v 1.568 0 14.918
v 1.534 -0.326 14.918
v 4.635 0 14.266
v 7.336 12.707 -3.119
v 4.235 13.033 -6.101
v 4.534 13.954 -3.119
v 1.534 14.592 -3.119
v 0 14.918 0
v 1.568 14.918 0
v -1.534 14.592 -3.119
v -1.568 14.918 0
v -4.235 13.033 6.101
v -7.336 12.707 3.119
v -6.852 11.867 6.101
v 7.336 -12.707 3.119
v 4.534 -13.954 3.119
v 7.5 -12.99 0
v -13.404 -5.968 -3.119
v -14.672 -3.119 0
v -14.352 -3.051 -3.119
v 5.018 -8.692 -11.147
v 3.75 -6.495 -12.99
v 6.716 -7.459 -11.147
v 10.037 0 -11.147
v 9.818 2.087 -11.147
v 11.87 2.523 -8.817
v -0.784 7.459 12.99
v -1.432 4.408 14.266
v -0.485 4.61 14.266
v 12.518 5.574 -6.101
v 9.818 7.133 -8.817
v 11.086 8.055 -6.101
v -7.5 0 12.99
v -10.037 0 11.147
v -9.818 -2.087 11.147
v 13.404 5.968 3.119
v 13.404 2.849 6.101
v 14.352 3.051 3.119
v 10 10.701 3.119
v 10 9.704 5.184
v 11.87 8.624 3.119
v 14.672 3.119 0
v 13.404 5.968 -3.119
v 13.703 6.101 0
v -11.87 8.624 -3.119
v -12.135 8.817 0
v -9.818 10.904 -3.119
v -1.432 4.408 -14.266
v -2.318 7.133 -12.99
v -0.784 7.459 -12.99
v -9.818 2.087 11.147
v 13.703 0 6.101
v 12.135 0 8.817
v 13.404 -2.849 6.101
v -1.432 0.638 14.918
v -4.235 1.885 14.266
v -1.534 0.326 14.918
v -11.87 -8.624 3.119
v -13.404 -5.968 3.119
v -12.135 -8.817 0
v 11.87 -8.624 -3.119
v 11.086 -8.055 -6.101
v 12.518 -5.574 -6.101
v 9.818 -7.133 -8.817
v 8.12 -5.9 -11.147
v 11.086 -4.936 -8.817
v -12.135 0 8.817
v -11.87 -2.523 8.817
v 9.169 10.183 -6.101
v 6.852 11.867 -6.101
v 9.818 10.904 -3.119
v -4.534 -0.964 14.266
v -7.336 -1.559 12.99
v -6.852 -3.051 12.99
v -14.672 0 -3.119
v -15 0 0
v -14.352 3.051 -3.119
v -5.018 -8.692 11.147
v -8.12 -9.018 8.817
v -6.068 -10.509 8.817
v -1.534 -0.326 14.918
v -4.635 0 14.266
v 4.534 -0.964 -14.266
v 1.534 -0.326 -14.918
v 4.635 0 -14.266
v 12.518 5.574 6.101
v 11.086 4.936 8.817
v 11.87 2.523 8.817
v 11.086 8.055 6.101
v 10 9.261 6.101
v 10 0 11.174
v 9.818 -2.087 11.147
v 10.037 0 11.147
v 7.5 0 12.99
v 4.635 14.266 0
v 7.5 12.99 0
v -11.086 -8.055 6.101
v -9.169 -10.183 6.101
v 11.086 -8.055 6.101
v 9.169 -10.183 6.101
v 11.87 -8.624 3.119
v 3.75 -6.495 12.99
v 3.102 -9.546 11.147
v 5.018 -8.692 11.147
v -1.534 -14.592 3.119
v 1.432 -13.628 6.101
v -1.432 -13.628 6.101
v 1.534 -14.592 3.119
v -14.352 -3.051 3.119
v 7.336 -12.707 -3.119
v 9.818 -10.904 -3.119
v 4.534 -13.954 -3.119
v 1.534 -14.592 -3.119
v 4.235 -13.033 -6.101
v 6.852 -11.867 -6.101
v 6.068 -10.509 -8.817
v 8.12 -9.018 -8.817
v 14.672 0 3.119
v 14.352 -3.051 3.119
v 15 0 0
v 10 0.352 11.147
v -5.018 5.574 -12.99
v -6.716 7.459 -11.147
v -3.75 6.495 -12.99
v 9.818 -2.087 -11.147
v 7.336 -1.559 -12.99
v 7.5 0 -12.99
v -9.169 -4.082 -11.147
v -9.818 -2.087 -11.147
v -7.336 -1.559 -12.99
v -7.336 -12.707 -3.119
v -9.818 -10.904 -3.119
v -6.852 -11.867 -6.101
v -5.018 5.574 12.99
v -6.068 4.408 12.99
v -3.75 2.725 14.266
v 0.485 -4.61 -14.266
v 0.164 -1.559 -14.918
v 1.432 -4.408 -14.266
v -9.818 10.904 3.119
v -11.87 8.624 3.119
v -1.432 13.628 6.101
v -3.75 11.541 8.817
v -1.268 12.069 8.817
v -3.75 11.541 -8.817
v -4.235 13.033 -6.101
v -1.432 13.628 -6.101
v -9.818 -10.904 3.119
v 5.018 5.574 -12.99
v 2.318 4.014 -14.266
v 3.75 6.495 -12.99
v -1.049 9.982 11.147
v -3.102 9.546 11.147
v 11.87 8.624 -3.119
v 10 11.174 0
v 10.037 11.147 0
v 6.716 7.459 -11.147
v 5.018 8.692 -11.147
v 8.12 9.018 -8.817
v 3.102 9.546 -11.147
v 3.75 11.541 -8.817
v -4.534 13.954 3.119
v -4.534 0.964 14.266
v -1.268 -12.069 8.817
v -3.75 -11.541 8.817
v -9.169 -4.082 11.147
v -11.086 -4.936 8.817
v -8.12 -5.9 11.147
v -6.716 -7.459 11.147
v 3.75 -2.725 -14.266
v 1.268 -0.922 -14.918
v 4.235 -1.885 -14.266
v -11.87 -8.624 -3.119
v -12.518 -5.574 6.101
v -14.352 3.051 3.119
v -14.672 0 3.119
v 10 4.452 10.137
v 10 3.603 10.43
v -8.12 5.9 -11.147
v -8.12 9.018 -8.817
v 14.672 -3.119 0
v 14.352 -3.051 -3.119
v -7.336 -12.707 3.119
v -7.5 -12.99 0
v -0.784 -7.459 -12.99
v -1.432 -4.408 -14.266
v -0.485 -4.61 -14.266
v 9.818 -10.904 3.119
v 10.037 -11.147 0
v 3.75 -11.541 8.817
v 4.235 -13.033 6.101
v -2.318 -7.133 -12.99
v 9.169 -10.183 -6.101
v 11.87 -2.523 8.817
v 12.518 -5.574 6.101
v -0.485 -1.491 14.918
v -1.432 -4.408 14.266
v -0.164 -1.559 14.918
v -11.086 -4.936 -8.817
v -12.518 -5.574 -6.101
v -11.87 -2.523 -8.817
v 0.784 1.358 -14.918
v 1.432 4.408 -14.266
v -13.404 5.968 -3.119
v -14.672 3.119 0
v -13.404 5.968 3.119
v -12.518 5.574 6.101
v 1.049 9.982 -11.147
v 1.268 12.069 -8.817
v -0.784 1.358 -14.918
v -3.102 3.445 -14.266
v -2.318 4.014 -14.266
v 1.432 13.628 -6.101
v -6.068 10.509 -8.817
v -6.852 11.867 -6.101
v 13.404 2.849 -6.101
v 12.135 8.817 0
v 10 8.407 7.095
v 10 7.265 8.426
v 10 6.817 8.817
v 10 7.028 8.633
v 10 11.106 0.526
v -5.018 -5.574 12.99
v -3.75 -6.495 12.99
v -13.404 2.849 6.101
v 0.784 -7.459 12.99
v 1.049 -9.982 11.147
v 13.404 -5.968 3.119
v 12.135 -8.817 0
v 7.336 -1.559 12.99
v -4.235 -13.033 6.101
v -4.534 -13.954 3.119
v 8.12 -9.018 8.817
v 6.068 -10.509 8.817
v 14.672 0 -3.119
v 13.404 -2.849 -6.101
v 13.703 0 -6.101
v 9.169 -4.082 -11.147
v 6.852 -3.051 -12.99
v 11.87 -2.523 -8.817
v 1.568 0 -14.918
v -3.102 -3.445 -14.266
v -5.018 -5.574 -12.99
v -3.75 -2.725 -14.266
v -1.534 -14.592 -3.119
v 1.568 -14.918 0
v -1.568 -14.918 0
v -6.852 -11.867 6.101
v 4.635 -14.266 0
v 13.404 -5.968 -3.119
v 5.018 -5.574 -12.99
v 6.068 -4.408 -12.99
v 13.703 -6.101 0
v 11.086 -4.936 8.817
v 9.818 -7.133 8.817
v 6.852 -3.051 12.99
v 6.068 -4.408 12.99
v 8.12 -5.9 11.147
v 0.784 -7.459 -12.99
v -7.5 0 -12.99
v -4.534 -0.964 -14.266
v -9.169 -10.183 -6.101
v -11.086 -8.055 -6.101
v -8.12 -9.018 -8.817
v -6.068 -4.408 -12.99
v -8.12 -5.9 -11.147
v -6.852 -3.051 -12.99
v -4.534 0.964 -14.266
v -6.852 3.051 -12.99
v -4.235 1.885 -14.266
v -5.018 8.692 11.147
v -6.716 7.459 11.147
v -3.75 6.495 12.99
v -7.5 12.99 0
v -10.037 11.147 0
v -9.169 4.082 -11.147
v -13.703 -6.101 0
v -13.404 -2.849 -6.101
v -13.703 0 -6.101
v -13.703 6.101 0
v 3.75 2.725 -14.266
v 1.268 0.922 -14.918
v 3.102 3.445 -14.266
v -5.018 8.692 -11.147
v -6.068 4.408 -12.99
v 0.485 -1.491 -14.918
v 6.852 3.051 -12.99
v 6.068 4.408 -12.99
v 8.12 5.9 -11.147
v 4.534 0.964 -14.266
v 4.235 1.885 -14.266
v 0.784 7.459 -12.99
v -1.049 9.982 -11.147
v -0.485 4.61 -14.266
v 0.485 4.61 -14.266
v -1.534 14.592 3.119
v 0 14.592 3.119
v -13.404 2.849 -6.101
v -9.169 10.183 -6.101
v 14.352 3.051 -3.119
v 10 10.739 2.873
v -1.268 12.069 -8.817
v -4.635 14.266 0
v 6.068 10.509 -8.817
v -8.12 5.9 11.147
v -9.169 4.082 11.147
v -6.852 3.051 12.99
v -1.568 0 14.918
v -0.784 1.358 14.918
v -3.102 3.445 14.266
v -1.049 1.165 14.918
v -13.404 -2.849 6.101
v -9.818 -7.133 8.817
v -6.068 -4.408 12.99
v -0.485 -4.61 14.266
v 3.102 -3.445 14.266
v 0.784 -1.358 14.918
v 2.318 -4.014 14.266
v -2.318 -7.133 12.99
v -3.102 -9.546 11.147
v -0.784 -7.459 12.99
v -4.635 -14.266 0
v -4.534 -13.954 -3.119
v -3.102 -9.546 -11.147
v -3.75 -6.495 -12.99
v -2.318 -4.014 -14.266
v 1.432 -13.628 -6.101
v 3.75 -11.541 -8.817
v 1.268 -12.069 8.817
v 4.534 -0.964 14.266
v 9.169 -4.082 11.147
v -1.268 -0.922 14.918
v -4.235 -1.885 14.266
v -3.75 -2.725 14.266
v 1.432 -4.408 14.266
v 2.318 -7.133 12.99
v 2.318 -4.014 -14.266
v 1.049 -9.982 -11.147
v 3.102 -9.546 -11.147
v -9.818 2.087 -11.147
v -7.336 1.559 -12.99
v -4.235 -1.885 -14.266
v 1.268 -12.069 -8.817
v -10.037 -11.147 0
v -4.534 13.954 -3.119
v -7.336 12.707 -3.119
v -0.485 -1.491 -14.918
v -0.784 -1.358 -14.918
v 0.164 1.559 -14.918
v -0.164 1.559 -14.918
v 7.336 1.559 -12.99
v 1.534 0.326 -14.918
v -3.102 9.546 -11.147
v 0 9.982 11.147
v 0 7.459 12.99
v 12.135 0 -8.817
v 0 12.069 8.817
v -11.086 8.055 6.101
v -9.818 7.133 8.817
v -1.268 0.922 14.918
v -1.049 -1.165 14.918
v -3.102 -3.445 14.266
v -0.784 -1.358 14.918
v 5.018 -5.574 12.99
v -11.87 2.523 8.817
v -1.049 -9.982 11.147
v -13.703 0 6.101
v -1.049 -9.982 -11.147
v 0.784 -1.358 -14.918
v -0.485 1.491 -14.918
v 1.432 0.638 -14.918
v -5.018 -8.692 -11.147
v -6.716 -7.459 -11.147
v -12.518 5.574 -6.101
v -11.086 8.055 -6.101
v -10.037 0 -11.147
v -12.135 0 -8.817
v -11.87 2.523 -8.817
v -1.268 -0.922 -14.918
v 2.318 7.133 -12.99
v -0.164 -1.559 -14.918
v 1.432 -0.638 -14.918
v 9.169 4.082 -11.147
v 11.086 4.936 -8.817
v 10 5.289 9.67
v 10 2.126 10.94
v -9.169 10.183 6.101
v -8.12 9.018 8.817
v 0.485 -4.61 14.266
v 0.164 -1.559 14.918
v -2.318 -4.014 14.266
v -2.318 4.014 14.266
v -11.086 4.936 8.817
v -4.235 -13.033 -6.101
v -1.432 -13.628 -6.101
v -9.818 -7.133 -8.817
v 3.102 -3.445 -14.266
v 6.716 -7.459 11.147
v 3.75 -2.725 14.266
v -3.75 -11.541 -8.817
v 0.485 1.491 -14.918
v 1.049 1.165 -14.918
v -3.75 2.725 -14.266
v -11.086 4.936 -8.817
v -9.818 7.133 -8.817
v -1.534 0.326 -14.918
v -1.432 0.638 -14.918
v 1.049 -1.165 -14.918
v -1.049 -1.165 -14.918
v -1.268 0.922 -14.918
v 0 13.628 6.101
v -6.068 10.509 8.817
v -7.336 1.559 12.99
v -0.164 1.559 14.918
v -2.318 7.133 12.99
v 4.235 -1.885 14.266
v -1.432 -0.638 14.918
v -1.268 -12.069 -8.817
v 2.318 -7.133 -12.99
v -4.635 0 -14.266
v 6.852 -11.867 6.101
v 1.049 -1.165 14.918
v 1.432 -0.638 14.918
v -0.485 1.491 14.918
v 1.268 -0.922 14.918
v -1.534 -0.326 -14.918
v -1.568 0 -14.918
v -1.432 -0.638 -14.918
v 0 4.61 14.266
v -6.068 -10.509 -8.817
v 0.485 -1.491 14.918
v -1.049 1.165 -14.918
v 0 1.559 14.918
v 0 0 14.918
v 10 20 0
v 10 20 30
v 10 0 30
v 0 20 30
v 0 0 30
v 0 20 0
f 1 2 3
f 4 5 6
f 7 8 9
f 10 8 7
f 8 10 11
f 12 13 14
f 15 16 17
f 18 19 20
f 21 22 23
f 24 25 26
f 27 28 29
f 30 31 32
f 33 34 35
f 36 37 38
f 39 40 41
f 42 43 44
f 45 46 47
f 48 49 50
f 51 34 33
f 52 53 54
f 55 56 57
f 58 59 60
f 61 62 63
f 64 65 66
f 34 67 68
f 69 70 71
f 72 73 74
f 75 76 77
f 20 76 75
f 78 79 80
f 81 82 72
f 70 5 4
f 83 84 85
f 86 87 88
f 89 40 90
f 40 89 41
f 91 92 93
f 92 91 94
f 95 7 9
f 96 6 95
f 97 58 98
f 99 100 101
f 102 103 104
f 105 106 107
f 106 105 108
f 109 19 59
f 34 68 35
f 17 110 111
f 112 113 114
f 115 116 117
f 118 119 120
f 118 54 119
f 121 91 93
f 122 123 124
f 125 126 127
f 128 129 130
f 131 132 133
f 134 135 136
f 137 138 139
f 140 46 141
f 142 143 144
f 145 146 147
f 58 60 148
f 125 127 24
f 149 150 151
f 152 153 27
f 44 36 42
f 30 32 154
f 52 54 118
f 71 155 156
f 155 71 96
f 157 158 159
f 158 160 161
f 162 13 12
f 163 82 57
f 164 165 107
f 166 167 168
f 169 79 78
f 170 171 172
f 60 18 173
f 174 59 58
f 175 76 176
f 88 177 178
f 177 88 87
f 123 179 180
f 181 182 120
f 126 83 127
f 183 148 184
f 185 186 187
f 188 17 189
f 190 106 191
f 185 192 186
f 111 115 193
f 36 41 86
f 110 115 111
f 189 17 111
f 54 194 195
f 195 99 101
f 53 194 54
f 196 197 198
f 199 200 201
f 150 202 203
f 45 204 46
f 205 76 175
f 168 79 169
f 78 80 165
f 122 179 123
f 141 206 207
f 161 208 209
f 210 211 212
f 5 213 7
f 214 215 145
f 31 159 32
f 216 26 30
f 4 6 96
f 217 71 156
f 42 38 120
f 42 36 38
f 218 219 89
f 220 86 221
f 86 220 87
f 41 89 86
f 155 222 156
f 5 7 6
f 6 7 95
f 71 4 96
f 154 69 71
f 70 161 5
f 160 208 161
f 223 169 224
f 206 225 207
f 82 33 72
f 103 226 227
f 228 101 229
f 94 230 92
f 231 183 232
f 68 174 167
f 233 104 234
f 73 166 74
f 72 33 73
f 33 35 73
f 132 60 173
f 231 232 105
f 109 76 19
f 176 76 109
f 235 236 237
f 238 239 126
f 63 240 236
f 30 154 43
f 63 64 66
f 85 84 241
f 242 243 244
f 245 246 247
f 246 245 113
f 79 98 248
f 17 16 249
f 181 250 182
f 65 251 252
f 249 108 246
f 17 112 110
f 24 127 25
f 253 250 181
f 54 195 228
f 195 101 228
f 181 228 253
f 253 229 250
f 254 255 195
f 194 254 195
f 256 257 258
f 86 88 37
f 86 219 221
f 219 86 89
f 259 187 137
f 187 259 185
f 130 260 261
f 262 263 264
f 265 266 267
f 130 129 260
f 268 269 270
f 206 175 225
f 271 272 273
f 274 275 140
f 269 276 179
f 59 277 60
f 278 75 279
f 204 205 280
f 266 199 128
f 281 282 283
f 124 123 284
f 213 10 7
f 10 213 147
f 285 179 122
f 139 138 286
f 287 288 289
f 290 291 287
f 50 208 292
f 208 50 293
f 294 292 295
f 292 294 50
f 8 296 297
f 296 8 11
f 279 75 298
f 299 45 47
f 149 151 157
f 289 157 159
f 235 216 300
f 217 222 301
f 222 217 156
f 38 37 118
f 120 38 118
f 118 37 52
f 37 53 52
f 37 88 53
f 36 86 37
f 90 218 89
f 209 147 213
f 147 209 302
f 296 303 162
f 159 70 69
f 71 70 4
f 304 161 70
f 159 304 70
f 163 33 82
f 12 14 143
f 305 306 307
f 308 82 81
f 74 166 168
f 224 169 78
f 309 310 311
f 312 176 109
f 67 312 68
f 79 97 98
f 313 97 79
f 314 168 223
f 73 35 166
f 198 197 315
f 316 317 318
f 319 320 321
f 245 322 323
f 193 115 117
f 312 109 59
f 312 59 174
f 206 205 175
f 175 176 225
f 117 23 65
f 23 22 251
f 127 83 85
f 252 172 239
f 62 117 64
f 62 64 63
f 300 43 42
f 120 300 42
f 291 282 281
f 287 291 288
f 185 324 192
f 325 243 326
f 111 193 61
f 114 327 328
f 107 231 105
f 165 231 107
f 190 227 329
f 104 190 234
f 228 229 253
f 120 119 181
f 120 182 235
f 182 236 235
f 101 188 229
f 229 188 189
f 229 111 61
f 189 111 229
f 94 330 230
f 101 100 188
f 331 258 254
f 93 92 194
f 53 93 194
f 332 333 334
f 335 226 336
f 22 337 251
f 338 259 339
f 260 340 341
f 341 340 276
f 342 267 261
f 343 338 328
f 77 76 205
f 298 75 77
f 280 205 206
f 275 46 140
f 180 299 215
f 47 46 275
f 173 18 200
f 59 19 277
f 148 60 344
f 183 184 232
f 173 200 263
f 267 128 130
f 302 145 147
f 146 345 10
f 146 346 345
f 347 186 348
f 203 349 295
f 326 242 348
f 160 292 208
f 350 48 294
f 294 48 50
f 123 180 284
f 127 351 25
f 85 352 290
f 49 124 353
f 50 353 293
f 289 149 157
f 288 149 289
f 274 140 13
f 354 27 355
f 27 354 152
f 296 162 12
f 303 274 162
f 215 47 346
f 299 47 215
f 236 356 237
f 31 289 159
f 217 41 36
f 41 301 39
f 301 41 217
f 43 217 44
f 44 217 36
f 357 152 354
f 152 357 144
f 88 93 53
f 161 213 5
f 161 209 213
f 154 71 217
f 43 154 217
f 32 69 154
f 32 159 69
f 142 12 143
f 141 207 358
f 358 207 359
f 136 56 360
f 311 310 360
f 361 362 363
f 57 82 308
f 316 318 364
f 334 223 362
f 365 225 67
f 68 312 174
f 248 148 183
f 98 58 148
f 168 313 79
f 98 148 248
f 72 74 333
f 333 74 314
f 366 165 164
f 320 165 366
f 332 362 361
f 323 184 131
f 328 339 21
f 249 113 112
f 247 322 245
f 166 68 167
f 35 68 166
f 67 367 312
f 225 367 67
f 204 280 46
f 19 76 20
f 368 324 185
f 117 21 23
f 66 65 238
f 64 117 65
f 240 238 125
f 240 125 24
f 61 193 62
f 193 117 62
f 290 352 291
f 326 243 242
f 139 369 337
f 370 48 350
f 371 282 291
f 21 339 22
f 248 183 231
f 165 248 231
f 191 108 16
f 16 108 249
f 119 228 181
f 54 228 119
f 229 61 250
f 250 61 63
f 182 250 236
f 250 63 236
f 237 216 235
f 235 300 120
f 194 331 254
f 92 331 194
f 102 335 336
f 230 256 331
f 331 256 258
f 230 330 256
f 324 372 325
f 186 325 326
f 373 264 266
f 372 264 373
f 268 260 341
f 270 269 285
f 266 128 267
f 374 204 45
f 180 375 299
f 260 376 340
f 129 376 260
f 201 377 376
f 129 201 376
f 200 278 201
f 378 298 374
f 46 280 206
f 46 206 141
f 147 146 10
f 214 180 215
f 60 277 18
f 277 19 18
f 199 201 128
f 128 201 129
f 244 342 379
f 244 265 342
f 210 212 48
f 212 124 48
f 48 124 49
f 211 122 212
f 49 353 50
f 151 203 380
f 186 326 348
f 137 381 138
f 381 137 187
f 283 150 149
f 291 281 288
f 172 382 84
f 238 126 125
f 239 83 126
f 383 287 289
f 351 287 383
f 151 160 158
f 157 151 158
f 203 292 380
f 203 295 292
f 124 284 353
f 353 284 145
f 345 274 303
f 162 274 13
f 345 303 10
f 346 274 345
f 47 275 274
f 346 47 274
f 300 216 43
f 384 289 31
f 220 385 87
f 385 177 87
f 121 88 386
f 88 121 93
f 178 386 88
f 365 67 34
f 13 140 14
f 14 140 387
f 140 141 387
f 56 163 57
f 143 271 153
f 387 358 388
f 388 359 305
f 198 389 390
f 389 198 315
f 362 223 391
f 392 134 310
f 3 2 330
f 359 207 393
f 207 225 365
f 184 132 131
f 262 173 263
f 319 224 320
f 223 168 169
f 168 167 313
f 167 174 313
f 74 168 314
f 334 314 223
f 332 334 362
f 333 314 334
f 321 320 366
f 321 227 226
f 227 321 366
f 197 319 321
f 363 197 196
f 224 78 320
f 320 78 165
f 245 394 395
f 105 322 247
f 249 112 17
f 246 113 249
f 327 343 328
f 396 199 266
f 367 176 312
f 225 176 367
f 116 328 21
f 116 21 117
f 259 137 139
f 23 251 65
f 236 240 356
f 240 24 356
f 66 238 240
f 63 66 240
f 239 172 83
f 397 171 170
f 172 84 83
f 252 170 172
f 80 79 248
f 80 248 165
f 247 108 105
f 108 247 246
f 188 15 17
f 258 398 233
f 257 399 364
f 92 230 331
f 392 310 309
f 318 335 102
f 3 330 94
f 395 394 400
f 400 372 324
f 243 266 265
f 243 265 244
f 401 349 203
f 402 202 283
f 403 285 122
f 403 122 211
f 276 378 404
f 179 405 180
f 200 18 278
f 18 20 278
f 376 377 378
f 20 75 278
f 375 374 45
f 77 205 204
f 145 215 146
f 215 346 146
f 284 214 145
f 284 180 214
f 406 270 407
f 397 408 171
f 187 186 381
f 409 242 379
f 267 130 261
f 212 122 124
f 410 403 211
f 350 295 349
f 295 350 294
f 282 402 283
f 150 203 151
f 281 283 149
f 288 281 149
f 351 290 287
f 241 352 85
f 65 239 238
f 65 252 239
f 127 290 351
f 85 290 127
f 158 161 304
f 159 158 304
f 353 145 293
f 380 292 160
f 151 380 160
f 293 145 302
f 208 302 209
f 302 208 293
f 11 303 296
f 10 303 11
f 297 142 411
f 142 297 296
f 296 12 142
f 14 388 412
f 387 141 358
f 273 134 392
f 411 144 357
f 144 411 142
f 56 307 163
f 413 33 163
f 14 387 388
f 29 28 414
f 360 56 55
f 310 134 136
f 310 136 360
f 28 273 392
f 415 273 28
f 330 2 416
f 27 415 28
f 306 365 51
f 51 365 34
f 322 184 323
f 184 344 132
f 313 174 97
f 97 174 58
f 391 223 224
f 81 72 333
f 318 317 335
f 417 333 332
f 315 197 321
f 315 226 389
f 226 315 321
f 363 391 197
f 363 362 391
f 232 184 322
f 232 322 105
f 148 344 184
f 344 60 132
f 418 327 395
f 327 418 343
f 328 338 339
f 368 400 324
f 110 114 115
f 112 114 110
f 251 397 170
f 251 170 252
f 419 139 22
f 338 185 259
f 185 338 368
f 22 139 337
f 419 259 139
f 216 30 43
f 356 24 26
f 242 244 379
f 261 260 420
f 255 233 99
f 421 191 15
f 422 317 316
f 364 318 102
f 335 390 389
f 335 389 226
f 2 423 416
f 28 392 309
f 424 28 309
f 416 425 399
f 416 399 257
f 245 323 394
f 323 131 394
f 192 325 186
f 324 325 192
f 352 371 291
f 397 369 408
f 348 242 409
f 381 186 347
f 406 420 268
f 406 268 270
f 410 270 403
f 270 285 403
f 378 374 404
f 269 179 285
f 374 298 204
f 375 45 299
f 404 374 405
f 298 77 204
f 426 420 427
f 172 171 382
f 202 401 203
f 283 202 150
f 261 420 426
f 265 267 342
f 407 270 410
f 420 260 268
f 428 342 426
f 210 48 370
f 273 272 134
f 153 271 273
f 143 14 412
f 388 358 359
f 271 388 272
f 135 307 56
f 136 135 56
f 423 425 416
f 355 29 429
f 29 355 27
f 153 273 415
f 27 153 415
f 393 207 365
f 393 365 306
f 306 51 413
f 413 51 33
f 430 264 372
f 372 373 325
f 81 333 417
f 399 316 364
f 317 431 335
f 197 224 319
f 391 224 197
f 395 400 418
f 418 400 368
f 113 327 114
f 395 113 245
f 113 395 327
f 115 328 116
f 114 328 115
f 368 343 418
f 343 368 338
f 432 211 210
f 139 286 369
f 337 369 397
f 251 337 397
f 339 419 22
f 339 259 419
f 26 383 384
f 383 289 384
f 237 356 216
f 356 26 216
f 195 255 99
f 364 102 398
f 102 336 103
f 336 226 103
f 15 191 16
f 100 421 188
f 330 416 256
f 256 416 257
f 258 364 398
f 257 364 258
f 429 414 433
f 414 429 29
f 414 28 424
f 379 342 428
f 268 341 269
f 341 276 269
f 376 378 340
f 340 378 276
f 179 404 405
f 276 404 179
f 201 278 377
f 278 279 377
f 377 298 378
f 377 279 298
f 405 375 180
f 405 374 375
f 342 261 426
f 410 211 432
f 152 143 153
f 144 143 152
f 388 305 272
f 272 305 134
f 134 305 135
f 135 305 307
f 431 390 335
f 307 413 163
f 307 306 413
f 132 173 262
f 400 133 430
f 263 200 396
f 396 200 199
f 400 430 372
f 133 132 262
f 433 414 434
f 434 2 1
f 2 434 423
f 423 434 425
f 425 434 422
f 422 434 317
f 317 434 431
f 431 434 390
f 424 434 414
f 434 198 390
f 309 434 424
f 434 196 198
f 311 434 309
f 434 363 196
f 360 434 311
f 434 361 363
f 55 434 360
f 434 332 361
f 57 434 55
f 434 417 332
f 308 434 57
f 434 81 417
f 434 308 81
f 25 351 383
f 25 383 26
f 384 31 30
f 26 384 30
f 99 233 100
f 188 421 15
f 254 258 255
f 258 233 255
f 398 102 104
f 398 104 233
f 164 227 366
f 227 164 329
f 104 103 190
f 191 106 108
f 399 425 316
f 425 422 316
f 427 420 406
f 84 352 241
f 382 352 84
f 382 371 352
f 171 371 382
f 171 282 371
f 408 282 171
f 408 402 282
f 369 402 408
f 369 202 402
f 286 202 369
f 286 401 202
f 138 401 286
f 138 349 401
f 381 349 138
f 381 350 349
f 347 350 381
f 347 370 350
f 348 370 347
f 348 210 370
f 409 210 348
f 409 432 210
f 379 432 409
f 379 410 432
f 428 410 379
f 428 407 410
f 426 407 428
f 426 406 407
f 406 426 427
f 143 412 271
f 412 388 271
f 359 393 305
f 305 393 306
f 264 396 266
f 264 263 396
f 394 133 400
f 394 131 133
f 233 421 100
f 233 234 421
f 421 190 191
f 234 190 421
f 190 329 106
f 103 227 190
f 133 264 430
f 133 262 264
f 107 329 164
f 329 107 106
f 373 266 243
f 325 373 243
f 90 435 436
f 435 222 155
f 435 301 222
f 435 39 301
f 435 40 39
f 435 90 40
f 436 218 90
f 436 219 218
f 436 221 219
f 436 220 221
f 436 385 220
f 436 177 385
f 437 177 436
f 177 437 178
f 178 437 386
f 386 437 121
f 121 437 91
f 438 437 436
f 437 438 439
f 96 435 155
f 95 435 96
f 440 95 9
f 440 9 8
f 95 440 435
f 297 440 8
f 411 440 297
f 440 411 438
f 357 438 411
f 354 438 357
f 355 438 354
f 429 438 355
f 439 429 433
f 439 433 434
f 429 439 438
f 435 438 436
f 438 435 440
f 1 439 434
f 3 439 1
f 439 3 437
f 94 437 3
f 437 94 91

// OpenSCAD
union() {
sphere(d=30);
cube(size=[10,20,30]);
}

/*
<json>
    {
        "Name": ["Vertical Pillars"],
        "Desc": "Use the slider to indicate how many columns printed acceptably.",
        "LowKeyword": "Lost",
        "HighKeyword": "Printed",
        "varBase": "VarBase1",
        "minDefault": 0.1,
        "maxDefault": 2,
        "minDefaultND": "0.5 * nozzleDiameter",
        "maxDefaultND": "5 * nozzleDiameter",
        "cameraData": "-2.28,2.59,6.06,59.9,0,13.8,113.4",
        "sortOrder": 0,
		"instanceCount": 10
    }
</json>
*/
